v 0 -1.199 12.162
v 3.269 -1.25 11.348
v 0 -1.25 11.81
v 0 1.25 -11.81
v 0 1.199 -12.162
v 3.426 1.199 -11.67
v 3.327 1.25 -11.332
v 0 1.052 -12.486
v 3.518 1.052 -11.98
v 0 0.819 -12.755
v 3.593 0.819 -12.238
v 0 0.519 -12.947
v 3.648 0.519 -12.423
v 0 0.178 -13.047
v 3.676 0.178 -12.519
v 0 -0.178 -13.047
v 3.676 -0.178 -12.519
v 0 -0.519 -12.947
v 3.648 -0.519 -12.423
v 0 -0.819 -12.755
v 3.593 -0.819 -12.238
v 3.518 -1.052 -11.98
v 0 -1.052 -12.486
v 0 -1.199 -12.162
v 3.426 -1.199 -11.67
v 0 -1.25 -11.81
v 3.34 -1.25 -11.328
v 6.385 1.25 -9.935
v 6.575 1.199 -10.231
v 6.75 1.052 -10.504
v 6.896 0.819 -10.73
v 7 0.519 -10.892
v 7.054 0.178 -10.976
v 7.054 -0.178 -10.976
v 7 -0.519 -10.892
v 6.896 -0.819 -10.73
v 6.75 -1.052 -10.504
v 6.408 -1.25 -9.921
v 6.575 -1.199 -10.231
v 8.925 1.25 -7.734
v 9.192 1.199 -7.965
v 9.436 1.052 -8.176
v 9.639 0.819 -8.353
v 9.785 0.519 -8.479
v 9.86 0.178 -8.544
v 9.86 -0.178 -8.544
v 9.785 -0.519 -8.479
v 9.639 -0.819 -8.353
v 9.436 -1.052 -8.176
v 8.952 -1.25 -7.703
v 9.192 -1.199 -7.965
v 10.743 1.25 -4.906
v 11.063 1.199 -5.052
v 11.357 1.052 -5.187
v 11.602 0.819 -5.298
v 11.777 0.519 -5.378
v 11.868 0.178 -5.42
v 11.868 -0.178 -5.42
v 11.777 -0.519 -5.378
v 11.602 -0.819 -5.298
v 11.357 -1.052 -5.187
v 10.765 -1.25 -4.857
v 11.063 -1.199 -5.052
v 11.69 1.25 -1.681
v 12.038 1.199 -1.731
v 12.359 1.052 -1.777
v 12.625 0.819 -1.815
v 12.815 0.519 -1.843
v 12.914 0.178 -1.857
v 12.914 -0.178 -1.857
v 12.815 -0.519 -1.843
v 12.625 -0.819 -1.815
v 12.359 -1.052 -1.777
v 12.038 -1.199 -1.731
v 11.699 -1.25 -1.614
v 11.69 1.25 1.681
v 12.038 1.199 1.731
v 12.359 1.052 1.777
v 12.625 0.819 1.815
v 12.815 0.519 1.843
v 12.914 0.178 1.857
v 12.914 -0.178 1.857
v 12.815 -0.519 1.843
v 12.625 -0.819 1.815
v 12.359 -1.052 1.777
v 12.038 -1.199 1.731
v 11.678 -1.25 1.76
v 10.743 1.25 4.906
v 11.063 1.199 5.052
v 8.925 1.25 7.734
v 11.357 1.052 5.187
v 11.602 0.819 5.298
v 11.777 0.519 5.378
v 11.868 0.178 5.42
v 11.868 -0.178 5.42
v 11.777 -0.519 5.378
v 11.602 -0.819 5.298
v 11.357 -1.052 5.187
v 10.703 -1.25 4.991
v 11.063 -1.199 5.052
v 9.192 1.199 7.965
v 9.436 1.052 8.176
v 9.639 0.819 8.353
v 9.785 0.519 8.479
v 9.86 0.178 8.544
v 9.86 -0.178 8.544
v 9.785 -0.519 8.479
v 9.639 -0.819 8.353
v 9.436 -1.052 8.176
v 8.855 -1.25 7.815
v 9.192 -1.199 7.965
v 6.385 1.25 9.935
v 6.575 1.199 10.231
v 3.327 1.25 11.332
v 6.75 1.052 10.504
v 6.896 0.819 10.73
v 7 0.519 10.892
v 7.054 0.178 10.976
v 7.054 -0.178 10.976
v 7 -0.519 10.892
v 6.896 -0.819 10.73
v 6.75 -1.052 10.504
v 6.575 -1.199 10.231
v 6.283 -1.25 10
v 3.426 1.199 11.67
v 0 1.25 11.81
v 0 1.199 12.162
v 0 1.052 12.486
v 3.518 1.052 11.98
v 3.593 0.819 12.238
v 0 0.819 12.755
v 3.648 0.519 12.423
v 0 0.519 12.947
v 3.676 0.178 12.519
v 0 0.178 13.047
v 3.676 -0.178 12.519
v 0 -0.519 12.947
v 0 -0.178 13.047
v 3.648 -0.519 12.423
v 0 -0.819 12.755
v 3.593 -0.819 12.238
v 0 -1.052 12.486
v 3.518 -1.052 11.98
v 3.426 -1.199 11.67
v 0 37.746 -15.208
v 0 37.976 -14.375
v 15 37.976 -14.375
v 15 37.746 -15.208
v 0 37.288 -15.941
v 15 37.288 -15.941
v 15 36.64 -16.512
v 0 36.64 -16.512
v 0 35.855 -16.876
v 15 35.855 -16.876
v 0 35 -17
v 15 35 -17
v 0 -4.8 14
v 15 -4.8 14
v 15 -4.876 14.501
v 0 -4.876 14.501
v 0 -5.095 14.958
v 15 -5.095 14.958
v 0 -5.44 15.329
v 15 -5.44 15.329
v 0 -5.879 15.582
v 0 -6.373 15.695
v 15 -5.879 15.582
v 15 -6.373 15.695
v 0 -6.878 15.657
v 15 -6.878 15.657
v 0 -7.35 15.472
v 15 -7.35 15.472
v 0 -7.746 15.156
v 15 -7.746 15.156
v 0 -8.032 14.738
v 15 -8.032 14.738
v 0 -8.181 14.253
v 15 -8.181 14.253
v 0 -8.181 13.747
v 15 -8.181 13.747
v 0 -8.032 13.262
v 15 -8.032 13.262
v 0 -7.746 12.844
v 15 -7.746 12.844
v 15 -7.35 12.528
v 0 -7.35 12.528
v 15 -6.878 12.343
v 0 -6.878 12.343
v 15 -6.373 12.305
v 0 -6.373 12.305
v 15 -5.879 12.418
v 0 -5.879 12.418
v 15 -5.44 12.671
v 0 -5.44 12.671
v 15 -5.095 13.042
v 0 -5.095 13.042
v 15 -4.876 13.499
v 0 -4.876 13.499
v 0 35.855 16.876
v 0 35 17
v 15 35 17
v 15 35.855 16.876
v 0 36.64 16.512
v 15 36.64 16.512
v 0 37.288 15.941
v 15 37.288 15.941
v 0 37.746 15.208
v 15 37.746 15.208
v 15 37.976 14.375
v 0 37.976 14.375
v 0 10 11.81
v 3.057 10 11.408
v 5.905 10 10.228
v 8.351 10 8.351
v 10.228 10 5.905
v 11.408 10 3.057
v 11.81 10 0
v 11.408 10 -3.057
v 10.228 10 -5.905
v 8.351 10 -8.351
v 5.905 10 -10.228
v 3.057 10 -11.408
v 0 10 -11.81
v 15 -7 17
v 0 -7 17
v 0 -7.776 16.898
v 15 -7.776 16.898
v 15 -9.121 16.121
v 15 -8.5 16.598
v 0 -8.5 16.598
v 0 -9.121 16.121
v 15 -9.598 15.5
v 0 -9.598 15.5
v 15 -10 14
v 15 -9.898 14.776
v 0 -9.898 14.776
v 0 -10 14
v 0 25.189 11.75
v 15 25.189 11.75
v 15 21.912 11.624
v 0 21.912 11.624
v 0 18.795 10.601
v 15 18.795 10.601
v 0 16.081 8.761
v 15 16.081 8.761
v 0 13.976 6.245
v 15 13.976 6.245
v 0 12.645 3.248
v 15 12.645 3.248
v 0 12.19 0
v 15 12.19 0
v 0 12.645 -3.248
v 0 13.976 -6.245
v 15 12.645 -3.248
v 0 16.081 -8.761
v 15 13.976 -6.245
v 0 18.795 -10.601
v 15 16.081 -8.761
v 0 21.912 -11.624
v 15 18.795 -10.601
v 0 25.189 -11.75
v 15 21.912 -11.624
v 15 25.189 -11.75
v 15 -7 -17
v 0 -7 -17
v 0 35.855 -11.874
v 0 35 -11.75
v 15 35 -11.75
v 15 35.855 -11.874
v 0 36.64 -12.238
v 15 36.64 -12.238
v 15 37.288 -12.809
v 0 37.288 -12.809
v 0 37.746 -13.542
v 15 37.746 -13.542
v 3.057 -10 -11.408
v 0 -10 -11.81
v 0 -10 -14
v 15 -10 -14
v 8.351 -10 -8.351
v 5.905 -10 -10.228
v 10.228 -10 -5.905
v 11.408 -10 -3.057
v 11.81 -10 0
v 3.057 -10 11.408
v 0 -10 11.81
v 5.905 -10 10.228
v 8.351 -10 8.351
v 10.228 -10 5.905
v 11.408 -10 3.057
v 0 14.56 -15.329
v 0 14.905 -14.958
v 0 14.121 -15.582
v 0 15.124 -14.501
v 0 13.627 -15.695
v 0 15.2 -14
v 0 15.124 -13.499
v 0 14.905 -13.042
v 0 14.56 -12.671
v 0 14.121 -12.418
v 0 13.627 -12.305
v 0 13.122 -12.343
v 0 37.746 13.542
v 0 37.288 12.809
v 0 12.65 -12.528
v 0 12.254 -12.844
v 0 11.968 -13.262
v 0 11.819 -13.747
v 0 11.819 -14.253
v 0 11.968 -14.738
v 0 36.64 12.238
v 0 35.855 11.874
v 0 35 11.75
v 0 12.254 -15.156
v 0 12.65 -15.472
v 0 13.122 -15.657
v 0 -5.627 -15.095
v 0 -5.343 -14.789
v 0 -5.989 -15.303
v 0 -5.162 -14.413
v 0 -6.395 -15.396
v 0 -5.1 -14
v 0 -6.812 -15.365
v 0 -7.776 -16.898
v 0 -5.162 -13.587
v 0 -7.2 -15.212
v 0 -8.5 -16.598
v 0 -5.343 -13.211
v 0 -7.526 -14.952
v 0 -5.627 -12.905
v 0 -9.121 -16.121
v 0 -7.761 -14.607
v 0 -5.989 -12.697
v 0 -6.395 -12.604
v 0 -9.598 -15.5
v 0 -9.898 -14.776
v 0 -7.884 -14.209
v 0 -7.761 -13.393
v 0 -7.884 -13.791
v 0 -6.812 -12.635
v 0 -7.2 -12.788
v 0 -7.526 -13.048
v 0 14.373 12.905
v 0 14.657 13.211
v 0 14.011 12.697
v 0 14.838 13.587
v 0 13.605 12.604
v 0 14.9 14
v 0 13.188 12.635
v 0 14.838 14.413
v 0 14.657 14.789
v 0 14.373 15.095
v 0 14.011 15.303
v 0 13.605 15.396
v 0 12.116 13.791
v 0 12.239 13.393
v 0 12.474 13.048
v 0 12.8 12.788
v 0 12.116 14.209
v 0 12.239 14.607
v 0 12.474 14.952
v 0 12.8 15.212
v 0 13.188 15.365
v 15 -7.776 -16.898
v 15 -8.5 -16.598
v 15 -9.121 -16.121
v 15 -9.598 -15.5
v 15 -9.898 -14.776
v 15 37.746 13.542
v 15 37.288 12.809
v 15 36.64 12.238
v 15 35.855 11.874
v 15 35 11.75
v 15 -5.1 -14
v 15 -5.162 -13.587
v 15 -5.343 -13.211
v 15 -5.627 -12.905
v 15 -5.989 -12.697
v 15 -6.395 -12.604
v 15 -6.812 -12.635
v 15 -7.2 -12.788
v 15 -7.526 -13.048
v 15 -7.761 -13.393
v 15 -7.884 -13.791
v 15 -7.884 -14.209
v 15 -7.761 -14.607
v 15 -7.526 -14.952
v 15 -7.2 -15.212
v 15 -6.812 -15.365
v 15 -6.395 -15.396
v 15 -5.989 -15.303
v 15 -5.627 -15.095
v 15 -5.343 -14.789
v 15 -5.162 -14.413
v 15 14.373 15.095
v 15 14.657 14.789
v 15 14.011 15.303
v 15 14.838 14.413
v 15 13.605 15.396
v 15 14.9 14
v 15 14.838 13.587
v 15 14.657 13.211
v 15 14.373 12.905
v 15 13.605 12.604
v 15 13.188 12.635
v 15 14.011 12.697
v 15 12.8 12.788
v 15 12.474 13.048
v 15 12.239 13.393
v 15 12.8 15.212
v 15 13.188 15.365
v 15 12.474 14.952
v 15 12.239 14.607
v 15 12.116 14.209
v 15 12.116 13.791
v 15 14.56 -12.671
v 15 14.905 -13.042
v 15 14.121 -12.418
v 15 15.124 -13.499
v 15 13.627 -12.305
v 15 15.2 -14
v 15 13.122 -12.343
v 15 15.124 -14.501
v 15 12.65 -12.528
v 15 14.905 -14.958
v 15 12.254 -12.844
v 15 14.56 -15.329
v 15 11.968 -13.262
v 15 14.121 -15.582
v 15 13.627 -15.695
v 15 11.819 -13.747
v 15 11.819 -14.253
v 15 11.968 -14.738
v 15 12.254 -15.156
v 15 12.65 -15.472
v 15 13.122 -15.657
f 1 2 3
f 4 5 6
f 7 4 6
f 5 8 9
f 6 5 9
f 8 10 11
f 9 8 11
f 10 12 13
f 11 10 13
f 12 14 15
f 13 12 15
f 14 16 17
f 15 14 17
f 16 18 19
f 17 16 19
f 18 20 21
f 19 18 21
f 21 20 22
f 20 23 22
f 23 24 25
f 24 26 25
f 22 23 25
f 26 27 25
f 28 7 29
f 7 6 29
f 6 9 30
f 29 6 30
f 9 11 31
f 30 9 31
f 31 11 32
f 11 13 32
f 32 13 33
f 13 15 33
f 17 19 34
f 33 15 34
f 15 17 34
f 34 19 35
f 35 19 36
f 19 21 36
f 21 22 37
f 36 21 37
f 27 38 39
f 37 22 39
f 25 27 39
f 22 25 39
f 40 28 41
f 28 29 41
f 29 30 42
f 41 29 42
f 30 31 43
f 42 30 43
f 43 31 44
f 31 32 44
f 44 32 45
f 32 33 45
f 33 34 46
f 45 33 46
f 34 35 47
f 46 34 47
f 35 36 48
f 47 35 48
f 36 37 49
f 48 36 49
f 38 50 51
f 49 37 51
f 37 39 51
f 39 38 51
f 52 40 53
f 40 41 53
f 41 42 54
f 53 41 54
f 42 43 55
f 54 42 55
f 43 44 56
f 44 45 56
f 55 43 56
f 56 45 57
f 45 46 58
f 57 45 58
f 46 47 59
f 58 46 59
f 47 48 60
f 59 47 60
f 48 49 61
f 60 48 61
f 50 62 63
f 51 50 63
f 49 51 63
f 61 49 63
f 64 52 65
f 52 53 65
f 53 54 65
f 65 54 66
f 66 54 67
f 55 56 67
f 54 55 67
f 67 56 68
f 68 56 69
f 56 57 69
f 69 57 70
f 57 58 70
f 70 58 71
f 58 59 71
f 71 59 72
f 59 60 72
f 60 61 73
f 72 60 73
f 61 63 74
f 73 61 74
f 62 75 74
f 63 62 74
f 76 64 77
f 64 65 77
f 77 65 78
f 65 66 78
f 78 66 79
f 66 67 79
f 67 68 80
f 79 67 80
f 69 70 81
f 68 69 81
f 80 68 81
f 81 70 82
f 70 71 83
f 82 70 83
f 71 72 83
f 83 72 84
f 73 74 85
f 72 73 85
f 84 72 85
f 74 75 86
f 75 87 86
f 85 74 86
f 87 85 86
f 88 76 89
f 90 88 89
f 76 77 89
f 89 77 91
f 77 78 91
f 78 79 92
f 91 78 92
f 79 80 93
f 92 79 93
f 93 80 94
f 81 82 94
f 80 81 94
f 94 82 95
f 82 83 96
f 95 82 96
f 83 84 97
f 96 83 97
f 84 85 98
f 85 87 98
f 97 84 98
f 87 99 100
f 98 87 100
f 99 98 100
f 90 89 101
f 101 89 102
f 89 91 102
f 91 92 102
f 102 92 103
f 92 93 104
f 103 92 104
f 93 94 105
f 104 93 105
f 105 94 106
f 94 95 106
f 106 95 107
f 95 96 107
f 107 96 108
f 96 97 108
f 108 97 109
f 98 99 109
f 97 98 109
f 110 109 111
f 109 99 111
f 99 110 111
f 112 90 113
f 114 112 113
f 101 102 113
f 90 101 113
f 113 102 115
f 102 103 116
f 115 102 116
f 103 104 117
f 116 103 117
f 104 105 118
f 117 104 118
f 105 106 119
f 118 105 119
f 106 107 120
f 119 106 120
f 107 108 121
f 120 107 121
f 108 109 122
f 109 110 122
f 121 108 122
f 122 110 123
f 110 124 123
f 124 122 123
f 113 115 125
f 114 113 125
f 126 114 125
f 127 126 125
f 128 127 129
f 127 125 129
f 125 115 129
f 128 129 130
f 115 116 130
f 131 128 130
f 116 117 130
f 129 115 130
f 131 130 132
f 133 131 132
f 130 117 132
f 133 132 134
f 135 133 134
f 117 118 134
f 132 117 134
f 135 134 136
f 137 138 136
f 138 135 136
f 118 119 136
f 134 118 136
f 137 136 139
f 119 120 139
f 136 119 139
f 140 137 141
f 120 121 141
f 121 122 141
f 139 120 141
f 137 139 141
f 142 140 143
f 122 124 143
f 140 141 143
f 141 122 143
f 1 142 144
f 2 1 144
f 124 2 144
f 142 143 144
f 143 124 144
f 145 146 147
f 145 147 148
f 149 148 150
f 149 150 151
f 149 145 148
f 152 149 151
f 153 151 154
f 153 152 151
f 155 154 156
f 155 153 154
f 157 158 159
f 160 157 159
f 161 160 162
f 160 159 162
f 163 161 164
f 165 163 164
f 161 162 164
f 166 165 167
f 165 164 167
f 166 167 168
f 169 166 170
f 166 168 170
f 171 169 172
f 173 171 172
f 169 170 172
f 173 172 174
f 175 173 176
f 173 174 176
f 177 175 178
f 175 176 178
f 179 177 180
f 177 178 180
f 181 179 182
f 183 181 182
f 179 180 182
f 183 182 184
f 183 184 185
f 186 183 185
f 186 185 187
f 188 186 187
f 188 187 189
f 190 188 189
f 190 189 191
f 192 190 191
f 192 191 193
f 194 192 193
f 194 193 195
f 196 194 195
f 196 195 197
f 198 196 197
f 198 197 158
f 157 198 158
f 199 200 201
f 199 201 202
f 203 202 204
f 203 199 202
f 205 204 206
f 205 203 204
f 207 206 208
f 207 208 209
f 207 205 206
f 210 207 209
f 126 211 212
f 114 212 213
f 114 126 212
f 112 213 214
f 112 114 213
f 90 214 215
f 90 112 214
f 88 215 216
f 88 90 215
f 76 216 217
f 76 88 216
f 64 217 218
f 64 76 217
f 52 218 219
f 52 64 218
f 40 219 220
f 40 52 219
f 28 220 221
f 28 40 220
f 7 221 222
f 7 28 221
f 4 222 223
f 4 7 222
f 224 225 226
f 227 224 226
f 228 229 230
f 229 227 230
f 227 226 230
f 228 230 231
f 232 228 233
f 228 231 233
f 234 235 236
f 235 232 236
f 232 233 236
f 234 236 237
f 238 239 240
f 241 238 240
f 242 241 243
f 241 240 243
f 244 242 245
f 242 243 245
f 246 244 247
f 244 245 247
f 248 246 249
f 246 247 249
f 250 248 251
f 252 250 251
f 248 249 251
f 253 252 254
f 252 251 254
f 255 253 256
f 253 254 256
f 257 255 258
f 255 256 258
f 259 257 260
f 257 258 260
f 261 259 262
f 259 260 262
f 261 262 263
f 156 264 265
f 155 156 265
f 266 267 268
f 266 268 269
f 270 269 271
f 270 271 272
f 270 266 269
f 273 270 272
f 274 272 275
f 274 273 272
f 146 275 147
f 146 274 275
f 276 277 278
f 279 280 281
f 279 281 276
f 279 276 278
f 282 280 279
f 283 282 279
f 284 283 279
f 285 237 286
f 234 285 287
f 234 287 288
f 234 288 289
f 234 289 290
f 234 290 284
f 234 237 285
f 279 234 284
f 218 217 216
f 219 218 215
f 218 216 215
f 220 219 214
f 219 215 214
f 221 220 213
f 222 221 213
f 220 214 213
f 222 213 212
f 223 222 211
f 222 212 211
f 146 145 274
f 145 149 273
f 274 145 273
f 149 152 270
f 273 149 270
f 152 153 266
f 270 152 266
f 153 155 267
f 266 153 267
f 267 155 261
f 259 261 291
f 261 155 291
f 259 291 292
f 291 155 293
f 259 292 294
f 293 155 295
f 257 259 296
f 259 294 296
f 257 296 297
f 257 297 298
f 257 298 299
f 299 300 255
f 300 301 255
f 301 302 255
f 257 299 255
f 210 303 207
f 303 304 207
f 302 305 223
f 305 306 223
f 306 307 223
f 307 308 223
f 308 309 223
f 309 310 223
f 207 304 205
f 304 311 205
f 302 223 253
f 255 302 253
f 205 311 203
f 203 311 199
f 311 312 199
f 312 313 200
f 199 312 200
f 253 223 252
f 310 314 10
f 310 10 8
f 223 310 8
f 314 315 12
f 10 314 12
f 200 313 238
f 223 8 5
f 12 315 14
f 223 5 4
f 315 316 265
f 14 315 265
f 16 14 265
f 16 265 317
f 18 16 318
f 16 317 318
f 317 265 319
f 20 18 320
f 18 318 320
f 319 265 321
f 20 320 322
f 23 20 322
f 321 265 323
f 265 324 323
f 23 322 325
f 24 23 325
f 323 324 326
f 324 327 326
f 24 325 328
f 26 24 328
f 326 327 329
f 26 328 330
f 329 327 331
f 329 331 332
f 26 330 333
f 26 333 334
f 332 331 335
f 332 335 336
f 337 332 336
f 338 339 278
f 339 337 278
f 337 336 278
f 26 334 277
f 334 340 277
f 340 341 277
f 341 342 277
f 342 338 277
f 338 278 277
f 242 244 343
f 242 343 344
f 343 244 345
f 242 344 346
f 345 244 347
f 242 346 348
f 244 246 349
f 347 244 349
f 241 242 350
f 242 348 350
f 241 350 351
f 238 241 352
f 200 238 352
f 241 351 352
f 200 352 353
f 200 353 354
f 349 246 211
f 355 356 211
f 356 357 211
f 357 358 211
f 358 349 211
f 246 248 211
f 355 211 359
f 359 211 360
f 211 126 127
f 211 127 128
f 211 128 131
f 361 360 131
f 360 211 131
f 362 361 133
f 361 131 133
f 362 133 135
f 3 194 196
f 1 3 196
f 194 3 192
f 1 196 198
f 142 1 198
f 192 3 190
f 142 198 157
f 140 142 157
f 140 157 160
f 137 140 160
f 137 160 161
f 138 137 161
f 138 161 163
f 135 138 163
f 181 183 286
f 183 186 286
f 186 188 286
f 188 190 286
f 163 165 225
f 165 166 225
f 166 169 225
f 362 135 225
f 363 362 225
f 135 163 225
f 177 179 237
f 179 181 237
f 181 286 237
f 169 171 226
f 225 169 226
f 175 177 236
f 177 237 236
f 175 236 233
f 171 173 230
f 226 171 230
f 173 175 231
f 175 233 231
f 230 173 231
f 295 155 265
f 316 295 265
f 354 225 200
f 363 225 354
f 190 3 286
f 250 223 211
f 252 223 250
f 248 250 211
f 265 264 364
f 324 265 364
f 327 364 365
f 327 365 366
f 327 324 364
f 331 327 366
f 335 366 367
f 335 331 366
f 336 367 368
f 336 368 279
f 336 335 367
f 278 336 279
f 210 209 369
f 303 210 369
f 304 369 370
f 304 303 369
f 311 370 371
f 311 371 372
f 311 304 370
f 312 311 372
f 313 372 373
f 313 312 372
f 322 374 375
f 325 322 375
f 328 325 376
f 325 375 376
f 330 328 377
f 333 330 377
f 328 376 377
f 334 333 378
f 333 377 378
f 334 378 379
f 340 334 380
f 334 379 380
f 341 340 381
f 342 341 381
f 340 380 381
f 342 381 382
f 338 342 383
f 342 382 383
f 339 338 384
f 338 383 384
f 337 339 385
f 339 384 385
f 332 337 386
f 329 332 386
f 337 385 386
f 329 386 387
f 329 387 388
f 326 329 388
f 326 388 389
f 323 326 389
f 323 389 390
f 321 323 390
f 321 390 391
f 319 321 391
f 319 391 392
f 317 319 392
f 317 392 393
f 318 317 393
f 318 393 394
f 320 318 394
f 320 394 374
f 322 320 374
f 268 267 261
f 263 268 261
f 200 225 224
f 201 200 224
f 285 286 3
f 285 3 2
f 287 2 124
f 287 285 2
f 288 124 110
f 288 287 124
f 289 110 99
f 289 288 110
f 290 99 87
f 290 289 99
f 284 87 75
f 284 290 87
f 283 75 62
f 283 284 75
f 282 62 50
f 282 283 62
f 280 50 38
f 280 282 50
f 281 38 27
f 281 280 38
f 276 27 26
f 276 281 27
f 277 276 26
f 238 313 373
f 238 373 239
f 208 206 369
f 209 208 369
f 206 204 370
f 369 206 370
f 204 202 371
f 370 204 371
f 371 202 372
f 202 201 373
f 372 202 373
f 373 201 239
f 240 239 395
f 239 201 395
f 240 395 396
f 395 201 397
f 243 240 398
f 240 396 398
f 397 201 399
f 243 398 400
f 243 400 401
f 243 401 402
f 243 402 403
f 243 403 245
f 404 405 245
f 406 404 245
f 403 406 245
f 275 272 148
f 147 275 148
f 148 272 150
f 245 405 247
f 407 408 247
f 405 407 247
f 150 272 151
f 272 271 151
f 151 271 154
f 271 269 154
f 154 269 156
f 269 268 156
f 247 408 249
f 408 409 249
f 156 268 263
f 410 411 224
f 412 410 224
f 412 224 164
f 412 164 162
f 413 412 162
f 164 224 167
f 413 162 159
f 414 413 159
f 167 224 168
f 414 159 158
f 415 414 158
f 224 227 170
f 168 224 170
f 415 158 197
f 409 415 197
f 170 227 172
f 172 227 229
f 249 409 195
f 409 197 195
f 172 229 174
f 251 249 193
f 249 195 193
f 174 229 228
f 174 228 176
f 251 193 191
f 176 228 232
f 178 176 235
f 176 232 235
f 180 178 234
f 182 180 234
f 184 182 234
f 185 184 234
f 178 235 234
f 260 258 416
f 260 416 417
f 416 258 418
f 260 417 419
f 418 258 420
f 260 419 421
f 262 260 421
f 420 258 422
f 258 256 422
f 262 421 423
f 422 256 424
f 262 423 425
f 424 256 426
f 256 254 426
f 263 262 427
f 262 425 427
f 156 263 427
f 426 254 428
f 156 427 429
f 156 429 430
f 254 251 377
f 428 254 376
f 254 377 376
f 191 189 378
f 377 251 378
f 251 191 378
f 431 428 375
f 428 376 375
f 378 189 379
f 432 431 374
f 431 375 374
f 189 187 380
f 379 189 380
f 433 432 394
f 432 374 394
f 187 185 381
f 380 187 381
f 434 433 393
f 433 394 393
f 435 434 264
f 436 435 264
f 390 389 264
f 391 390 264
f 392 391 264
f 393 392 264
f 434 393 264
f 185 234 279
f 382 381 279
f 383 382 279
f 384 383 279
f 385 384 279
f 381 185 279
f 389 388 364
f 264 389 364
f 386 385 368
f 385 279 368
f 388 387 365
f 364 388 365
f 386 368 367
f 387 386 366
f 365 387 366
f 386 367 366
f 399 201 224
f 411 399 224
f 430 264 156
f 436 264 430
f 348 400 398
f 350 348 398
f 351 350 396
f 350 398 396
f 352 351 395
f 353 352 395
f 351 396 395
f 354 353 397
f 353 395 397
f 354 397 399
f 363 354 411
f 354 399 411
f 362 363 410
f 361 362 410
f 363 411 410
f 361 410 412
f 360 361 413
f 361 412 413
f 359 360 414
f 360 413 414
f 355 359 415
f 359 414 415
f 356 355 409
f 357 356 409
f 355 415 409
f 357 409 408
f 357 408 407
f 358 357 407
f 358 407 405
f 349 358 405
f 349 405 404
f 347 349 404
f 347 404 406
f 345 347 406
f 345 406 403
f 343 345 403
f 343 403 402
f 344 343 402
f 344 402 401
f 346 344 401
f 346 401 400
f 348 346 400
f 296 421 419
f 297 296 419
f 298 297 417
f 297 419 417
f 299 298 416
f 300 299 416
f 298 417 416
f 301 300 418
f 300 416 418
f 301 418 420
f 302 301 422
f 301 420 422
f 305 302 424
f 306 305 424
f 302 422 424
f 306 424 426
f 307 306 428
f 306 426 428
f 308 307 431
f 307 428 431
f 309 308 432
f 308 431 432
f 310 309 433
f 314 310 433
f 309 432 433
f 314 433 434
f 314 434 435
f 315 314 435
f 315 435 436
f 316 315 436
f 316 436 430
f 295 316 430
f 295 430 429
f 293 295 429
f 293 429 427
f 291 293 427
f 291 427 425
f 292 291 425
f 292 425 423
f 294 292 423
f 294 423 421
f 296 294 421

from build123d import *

# Parameters (mm, degrees)
F1_DEPTH      = 10
F1_DEPTH_BACK = 10
F5_DEPTH      = 28
F8_D          = 23.62
F9_D          = 2.8
F9_ON_F2_D    = 2.8
F10_D         = 3.4
F10_ON_F2_D   = 3.4
F7_W          = 14
F7_H          = 23.5
F11_DEPTH     = 25
F12_T1_DEPTH  = 30


# Not quite as in the source:
# - a fillet or chamfer that OpenCascade refuses, or shapes differently, is made with other operations: its cross-section is extruded or revolved along the edge and cut away or added


with BuildPart() as f1:
    # F0 (on Front) → F1 (new body, two sides)
    with BuildSketch(Plane.XZ) as f1_sk:
        with BuildLine():
            Line((15, 17), (0, 17))
            Line((0, 17), (0, 11.81))
            ThreePointArc((0, 11.81), (8.3509310858, 8.3509310858), (11.81, 0))
            ThreePointArc((11.81, 0), (8.3509310858, -8.3509310858), (0, -11.81))
            Line((0, -11.81), (0, -17))
            Line((0, -17), (15, -17))
            Line((15, -17), (15, 17))
        make_face()
    extrude(amount=F1_DEPTH)
    extrude(f1_sk.sketch, amount=-F1_DEPTH_BACK)

    # F2 (on face) → F3 (revolve, cut)
    with BuildSketch(Plane(origin=(0, 0, 0), x_dir=(0, -1, 0), z_dir=(-1, 0, 0))):
        with BuildLine():
            Line((-1.25, -11.81), (1.25, -11.81))
            ThreePointArc((1.25, -11.81), (0, -10.56), (-1.25, -11.81))
        make_face()
        with BuildLine():
            ThreePointArc((-1.25, -11.81), (0, -13.06), (1.25, -11.81))
            Line((1.25, -11.81), (-1.25, -11.81))
        make_face()
    revolve(axis=Axis((0, 0, 0), (0, -1, 0)), mode=Mode.SUBTRACT)

    # F4 (on face) → F5 (join)
    with BuildSketch(Plane(origin=(0, 10, 0), x_dir=(-1, 0, 0), z_dir=(0, 1, 0))):
        with BuildLine():
            Line((0, -11.81), (0, 11.81))
            ThreePointArc((0, 11.81), (-11.81, 0), (0, -11.81))
        make_face()
        with BuildLine():
            Line((0, 17), (-15, 17))
            Line((-15, 17), (-15, -17))
            Line((-15, -17), (0, -17))
            Line((0, -17), (0, -11.81))
            ThreePointArc((0, -11.81), (-11.81, 0), (0, 11.81))
            Line((0, 11.81), (0, 17))
        make_face()
    extrude(amount=F5_DEPTH)

    # F6: union 

    # F8 (through all)
    with Locations(Plane(origin=(0, 0, 0), x_dir=(0, -1, 0), z_dir=(-1, 0, 0))):
        with Locations((-24, 0)):
            Hole(F8_D / 2)

    # F9 (through all)
    with Locations(Plane(origin=(0, 0, 0), x_dir=(0, -1, 0), z_dir=(-1, 0, 0))):
        with Locations((-13.5, 14)):
            Hole(F9_D / 2)

    # F9 on F2 (through all)
    with Locations(Plane(origin=(0, 0, 0), x_dir=(0, -1, 0), z_dir=(-1, 0, 0))):
        with Locations((6.5, -14)):
            Hole(F9_ON_F2_D / 2)

    # F10 (through all)
    with Locations(Plane(origin=(0, 0, 0), x_dir=(0, -1, 0), z_dir=(-1, 0, 0))):
        with Locations((-13.5, -14)):
            Hole(F10_D / 2)

    # F10 on F2 (through all)
    with Locations(Plane(origin=(0, 0, 0), x_dir=(0, -1, 0), z_dir=(-1, 0, 0))):
        with Locations((6.5, 14)):
            Hole(F10_ON_F2_D / 2)

    # F7 (on face) → F11 (cut)
    with BuildSketch(Plane(origin=(0, 0, 0), x_dir=(0, -1, 0), z_dir=(-1, 0, 0))):
        with Locations((-31, 0)):
            Rectangle(F7_W, F7_H)
    extrude(amount=-F11_DEPTH, mode=Mode.SUBTRACT)

    # F12: fillet of radius 3 on 6 edges, made by hand

    # F12_s2 → F12_t1 (cut)
    with BuildSketch(Plane.YZ.offset(-7.5)):
        with BuildLine():
            ThreePointArc((-7, -17), (-9.1213203436, -16.1213203436), (-10, -14))
            Line((-10, -14), (-10, -17))
            Line((-10, -17), (-7, -17))
        make_face()
        with BuildLine():
            ThreePointArc((-7, 17), (-9.1213203436, 16.1213203436), (-10, 14))
            Line((-10, 14), (-10, 17))
            Line((-10, 17), (-7, 17))
        make_face()
        with BuildLine():
            ThreePointArc((38, -14), (37.1213203436, -16.1213203436), (35, -17))
            Line((35, -17), (38, -17))
            Line((38, -17), (38, -14))
        make_face()
        with BuildLine():
            ThreePointArc((35, 17), (37.1213203436, 16.1213203436), (38, 14))
            Line((38, 14), (38, 17))
            Line((38, 17), (35, 17))
        make_face()
        with BuildLine():
            ThreePointArc((35, -11.75), (37.1213203436, -12.6286796564), (38, -14.75))
            Line((38, -14.75), (38, -11.75))
            Line((38, -11.75), (35, -11.75))
        make_face()
        with BuildLine():
            ThreePointArc((38, 14.75), (37.1213203436, 12.6286796564), (35, 11.75))
            Line((35, 11.75), (38, 11.75))
            Line((38, 11.75), (38, 14.75))
        make_face()
    extrude(amount=F12_T1_DEPTH, mode=Mode.SUBTRACT)


solid = f1.part
